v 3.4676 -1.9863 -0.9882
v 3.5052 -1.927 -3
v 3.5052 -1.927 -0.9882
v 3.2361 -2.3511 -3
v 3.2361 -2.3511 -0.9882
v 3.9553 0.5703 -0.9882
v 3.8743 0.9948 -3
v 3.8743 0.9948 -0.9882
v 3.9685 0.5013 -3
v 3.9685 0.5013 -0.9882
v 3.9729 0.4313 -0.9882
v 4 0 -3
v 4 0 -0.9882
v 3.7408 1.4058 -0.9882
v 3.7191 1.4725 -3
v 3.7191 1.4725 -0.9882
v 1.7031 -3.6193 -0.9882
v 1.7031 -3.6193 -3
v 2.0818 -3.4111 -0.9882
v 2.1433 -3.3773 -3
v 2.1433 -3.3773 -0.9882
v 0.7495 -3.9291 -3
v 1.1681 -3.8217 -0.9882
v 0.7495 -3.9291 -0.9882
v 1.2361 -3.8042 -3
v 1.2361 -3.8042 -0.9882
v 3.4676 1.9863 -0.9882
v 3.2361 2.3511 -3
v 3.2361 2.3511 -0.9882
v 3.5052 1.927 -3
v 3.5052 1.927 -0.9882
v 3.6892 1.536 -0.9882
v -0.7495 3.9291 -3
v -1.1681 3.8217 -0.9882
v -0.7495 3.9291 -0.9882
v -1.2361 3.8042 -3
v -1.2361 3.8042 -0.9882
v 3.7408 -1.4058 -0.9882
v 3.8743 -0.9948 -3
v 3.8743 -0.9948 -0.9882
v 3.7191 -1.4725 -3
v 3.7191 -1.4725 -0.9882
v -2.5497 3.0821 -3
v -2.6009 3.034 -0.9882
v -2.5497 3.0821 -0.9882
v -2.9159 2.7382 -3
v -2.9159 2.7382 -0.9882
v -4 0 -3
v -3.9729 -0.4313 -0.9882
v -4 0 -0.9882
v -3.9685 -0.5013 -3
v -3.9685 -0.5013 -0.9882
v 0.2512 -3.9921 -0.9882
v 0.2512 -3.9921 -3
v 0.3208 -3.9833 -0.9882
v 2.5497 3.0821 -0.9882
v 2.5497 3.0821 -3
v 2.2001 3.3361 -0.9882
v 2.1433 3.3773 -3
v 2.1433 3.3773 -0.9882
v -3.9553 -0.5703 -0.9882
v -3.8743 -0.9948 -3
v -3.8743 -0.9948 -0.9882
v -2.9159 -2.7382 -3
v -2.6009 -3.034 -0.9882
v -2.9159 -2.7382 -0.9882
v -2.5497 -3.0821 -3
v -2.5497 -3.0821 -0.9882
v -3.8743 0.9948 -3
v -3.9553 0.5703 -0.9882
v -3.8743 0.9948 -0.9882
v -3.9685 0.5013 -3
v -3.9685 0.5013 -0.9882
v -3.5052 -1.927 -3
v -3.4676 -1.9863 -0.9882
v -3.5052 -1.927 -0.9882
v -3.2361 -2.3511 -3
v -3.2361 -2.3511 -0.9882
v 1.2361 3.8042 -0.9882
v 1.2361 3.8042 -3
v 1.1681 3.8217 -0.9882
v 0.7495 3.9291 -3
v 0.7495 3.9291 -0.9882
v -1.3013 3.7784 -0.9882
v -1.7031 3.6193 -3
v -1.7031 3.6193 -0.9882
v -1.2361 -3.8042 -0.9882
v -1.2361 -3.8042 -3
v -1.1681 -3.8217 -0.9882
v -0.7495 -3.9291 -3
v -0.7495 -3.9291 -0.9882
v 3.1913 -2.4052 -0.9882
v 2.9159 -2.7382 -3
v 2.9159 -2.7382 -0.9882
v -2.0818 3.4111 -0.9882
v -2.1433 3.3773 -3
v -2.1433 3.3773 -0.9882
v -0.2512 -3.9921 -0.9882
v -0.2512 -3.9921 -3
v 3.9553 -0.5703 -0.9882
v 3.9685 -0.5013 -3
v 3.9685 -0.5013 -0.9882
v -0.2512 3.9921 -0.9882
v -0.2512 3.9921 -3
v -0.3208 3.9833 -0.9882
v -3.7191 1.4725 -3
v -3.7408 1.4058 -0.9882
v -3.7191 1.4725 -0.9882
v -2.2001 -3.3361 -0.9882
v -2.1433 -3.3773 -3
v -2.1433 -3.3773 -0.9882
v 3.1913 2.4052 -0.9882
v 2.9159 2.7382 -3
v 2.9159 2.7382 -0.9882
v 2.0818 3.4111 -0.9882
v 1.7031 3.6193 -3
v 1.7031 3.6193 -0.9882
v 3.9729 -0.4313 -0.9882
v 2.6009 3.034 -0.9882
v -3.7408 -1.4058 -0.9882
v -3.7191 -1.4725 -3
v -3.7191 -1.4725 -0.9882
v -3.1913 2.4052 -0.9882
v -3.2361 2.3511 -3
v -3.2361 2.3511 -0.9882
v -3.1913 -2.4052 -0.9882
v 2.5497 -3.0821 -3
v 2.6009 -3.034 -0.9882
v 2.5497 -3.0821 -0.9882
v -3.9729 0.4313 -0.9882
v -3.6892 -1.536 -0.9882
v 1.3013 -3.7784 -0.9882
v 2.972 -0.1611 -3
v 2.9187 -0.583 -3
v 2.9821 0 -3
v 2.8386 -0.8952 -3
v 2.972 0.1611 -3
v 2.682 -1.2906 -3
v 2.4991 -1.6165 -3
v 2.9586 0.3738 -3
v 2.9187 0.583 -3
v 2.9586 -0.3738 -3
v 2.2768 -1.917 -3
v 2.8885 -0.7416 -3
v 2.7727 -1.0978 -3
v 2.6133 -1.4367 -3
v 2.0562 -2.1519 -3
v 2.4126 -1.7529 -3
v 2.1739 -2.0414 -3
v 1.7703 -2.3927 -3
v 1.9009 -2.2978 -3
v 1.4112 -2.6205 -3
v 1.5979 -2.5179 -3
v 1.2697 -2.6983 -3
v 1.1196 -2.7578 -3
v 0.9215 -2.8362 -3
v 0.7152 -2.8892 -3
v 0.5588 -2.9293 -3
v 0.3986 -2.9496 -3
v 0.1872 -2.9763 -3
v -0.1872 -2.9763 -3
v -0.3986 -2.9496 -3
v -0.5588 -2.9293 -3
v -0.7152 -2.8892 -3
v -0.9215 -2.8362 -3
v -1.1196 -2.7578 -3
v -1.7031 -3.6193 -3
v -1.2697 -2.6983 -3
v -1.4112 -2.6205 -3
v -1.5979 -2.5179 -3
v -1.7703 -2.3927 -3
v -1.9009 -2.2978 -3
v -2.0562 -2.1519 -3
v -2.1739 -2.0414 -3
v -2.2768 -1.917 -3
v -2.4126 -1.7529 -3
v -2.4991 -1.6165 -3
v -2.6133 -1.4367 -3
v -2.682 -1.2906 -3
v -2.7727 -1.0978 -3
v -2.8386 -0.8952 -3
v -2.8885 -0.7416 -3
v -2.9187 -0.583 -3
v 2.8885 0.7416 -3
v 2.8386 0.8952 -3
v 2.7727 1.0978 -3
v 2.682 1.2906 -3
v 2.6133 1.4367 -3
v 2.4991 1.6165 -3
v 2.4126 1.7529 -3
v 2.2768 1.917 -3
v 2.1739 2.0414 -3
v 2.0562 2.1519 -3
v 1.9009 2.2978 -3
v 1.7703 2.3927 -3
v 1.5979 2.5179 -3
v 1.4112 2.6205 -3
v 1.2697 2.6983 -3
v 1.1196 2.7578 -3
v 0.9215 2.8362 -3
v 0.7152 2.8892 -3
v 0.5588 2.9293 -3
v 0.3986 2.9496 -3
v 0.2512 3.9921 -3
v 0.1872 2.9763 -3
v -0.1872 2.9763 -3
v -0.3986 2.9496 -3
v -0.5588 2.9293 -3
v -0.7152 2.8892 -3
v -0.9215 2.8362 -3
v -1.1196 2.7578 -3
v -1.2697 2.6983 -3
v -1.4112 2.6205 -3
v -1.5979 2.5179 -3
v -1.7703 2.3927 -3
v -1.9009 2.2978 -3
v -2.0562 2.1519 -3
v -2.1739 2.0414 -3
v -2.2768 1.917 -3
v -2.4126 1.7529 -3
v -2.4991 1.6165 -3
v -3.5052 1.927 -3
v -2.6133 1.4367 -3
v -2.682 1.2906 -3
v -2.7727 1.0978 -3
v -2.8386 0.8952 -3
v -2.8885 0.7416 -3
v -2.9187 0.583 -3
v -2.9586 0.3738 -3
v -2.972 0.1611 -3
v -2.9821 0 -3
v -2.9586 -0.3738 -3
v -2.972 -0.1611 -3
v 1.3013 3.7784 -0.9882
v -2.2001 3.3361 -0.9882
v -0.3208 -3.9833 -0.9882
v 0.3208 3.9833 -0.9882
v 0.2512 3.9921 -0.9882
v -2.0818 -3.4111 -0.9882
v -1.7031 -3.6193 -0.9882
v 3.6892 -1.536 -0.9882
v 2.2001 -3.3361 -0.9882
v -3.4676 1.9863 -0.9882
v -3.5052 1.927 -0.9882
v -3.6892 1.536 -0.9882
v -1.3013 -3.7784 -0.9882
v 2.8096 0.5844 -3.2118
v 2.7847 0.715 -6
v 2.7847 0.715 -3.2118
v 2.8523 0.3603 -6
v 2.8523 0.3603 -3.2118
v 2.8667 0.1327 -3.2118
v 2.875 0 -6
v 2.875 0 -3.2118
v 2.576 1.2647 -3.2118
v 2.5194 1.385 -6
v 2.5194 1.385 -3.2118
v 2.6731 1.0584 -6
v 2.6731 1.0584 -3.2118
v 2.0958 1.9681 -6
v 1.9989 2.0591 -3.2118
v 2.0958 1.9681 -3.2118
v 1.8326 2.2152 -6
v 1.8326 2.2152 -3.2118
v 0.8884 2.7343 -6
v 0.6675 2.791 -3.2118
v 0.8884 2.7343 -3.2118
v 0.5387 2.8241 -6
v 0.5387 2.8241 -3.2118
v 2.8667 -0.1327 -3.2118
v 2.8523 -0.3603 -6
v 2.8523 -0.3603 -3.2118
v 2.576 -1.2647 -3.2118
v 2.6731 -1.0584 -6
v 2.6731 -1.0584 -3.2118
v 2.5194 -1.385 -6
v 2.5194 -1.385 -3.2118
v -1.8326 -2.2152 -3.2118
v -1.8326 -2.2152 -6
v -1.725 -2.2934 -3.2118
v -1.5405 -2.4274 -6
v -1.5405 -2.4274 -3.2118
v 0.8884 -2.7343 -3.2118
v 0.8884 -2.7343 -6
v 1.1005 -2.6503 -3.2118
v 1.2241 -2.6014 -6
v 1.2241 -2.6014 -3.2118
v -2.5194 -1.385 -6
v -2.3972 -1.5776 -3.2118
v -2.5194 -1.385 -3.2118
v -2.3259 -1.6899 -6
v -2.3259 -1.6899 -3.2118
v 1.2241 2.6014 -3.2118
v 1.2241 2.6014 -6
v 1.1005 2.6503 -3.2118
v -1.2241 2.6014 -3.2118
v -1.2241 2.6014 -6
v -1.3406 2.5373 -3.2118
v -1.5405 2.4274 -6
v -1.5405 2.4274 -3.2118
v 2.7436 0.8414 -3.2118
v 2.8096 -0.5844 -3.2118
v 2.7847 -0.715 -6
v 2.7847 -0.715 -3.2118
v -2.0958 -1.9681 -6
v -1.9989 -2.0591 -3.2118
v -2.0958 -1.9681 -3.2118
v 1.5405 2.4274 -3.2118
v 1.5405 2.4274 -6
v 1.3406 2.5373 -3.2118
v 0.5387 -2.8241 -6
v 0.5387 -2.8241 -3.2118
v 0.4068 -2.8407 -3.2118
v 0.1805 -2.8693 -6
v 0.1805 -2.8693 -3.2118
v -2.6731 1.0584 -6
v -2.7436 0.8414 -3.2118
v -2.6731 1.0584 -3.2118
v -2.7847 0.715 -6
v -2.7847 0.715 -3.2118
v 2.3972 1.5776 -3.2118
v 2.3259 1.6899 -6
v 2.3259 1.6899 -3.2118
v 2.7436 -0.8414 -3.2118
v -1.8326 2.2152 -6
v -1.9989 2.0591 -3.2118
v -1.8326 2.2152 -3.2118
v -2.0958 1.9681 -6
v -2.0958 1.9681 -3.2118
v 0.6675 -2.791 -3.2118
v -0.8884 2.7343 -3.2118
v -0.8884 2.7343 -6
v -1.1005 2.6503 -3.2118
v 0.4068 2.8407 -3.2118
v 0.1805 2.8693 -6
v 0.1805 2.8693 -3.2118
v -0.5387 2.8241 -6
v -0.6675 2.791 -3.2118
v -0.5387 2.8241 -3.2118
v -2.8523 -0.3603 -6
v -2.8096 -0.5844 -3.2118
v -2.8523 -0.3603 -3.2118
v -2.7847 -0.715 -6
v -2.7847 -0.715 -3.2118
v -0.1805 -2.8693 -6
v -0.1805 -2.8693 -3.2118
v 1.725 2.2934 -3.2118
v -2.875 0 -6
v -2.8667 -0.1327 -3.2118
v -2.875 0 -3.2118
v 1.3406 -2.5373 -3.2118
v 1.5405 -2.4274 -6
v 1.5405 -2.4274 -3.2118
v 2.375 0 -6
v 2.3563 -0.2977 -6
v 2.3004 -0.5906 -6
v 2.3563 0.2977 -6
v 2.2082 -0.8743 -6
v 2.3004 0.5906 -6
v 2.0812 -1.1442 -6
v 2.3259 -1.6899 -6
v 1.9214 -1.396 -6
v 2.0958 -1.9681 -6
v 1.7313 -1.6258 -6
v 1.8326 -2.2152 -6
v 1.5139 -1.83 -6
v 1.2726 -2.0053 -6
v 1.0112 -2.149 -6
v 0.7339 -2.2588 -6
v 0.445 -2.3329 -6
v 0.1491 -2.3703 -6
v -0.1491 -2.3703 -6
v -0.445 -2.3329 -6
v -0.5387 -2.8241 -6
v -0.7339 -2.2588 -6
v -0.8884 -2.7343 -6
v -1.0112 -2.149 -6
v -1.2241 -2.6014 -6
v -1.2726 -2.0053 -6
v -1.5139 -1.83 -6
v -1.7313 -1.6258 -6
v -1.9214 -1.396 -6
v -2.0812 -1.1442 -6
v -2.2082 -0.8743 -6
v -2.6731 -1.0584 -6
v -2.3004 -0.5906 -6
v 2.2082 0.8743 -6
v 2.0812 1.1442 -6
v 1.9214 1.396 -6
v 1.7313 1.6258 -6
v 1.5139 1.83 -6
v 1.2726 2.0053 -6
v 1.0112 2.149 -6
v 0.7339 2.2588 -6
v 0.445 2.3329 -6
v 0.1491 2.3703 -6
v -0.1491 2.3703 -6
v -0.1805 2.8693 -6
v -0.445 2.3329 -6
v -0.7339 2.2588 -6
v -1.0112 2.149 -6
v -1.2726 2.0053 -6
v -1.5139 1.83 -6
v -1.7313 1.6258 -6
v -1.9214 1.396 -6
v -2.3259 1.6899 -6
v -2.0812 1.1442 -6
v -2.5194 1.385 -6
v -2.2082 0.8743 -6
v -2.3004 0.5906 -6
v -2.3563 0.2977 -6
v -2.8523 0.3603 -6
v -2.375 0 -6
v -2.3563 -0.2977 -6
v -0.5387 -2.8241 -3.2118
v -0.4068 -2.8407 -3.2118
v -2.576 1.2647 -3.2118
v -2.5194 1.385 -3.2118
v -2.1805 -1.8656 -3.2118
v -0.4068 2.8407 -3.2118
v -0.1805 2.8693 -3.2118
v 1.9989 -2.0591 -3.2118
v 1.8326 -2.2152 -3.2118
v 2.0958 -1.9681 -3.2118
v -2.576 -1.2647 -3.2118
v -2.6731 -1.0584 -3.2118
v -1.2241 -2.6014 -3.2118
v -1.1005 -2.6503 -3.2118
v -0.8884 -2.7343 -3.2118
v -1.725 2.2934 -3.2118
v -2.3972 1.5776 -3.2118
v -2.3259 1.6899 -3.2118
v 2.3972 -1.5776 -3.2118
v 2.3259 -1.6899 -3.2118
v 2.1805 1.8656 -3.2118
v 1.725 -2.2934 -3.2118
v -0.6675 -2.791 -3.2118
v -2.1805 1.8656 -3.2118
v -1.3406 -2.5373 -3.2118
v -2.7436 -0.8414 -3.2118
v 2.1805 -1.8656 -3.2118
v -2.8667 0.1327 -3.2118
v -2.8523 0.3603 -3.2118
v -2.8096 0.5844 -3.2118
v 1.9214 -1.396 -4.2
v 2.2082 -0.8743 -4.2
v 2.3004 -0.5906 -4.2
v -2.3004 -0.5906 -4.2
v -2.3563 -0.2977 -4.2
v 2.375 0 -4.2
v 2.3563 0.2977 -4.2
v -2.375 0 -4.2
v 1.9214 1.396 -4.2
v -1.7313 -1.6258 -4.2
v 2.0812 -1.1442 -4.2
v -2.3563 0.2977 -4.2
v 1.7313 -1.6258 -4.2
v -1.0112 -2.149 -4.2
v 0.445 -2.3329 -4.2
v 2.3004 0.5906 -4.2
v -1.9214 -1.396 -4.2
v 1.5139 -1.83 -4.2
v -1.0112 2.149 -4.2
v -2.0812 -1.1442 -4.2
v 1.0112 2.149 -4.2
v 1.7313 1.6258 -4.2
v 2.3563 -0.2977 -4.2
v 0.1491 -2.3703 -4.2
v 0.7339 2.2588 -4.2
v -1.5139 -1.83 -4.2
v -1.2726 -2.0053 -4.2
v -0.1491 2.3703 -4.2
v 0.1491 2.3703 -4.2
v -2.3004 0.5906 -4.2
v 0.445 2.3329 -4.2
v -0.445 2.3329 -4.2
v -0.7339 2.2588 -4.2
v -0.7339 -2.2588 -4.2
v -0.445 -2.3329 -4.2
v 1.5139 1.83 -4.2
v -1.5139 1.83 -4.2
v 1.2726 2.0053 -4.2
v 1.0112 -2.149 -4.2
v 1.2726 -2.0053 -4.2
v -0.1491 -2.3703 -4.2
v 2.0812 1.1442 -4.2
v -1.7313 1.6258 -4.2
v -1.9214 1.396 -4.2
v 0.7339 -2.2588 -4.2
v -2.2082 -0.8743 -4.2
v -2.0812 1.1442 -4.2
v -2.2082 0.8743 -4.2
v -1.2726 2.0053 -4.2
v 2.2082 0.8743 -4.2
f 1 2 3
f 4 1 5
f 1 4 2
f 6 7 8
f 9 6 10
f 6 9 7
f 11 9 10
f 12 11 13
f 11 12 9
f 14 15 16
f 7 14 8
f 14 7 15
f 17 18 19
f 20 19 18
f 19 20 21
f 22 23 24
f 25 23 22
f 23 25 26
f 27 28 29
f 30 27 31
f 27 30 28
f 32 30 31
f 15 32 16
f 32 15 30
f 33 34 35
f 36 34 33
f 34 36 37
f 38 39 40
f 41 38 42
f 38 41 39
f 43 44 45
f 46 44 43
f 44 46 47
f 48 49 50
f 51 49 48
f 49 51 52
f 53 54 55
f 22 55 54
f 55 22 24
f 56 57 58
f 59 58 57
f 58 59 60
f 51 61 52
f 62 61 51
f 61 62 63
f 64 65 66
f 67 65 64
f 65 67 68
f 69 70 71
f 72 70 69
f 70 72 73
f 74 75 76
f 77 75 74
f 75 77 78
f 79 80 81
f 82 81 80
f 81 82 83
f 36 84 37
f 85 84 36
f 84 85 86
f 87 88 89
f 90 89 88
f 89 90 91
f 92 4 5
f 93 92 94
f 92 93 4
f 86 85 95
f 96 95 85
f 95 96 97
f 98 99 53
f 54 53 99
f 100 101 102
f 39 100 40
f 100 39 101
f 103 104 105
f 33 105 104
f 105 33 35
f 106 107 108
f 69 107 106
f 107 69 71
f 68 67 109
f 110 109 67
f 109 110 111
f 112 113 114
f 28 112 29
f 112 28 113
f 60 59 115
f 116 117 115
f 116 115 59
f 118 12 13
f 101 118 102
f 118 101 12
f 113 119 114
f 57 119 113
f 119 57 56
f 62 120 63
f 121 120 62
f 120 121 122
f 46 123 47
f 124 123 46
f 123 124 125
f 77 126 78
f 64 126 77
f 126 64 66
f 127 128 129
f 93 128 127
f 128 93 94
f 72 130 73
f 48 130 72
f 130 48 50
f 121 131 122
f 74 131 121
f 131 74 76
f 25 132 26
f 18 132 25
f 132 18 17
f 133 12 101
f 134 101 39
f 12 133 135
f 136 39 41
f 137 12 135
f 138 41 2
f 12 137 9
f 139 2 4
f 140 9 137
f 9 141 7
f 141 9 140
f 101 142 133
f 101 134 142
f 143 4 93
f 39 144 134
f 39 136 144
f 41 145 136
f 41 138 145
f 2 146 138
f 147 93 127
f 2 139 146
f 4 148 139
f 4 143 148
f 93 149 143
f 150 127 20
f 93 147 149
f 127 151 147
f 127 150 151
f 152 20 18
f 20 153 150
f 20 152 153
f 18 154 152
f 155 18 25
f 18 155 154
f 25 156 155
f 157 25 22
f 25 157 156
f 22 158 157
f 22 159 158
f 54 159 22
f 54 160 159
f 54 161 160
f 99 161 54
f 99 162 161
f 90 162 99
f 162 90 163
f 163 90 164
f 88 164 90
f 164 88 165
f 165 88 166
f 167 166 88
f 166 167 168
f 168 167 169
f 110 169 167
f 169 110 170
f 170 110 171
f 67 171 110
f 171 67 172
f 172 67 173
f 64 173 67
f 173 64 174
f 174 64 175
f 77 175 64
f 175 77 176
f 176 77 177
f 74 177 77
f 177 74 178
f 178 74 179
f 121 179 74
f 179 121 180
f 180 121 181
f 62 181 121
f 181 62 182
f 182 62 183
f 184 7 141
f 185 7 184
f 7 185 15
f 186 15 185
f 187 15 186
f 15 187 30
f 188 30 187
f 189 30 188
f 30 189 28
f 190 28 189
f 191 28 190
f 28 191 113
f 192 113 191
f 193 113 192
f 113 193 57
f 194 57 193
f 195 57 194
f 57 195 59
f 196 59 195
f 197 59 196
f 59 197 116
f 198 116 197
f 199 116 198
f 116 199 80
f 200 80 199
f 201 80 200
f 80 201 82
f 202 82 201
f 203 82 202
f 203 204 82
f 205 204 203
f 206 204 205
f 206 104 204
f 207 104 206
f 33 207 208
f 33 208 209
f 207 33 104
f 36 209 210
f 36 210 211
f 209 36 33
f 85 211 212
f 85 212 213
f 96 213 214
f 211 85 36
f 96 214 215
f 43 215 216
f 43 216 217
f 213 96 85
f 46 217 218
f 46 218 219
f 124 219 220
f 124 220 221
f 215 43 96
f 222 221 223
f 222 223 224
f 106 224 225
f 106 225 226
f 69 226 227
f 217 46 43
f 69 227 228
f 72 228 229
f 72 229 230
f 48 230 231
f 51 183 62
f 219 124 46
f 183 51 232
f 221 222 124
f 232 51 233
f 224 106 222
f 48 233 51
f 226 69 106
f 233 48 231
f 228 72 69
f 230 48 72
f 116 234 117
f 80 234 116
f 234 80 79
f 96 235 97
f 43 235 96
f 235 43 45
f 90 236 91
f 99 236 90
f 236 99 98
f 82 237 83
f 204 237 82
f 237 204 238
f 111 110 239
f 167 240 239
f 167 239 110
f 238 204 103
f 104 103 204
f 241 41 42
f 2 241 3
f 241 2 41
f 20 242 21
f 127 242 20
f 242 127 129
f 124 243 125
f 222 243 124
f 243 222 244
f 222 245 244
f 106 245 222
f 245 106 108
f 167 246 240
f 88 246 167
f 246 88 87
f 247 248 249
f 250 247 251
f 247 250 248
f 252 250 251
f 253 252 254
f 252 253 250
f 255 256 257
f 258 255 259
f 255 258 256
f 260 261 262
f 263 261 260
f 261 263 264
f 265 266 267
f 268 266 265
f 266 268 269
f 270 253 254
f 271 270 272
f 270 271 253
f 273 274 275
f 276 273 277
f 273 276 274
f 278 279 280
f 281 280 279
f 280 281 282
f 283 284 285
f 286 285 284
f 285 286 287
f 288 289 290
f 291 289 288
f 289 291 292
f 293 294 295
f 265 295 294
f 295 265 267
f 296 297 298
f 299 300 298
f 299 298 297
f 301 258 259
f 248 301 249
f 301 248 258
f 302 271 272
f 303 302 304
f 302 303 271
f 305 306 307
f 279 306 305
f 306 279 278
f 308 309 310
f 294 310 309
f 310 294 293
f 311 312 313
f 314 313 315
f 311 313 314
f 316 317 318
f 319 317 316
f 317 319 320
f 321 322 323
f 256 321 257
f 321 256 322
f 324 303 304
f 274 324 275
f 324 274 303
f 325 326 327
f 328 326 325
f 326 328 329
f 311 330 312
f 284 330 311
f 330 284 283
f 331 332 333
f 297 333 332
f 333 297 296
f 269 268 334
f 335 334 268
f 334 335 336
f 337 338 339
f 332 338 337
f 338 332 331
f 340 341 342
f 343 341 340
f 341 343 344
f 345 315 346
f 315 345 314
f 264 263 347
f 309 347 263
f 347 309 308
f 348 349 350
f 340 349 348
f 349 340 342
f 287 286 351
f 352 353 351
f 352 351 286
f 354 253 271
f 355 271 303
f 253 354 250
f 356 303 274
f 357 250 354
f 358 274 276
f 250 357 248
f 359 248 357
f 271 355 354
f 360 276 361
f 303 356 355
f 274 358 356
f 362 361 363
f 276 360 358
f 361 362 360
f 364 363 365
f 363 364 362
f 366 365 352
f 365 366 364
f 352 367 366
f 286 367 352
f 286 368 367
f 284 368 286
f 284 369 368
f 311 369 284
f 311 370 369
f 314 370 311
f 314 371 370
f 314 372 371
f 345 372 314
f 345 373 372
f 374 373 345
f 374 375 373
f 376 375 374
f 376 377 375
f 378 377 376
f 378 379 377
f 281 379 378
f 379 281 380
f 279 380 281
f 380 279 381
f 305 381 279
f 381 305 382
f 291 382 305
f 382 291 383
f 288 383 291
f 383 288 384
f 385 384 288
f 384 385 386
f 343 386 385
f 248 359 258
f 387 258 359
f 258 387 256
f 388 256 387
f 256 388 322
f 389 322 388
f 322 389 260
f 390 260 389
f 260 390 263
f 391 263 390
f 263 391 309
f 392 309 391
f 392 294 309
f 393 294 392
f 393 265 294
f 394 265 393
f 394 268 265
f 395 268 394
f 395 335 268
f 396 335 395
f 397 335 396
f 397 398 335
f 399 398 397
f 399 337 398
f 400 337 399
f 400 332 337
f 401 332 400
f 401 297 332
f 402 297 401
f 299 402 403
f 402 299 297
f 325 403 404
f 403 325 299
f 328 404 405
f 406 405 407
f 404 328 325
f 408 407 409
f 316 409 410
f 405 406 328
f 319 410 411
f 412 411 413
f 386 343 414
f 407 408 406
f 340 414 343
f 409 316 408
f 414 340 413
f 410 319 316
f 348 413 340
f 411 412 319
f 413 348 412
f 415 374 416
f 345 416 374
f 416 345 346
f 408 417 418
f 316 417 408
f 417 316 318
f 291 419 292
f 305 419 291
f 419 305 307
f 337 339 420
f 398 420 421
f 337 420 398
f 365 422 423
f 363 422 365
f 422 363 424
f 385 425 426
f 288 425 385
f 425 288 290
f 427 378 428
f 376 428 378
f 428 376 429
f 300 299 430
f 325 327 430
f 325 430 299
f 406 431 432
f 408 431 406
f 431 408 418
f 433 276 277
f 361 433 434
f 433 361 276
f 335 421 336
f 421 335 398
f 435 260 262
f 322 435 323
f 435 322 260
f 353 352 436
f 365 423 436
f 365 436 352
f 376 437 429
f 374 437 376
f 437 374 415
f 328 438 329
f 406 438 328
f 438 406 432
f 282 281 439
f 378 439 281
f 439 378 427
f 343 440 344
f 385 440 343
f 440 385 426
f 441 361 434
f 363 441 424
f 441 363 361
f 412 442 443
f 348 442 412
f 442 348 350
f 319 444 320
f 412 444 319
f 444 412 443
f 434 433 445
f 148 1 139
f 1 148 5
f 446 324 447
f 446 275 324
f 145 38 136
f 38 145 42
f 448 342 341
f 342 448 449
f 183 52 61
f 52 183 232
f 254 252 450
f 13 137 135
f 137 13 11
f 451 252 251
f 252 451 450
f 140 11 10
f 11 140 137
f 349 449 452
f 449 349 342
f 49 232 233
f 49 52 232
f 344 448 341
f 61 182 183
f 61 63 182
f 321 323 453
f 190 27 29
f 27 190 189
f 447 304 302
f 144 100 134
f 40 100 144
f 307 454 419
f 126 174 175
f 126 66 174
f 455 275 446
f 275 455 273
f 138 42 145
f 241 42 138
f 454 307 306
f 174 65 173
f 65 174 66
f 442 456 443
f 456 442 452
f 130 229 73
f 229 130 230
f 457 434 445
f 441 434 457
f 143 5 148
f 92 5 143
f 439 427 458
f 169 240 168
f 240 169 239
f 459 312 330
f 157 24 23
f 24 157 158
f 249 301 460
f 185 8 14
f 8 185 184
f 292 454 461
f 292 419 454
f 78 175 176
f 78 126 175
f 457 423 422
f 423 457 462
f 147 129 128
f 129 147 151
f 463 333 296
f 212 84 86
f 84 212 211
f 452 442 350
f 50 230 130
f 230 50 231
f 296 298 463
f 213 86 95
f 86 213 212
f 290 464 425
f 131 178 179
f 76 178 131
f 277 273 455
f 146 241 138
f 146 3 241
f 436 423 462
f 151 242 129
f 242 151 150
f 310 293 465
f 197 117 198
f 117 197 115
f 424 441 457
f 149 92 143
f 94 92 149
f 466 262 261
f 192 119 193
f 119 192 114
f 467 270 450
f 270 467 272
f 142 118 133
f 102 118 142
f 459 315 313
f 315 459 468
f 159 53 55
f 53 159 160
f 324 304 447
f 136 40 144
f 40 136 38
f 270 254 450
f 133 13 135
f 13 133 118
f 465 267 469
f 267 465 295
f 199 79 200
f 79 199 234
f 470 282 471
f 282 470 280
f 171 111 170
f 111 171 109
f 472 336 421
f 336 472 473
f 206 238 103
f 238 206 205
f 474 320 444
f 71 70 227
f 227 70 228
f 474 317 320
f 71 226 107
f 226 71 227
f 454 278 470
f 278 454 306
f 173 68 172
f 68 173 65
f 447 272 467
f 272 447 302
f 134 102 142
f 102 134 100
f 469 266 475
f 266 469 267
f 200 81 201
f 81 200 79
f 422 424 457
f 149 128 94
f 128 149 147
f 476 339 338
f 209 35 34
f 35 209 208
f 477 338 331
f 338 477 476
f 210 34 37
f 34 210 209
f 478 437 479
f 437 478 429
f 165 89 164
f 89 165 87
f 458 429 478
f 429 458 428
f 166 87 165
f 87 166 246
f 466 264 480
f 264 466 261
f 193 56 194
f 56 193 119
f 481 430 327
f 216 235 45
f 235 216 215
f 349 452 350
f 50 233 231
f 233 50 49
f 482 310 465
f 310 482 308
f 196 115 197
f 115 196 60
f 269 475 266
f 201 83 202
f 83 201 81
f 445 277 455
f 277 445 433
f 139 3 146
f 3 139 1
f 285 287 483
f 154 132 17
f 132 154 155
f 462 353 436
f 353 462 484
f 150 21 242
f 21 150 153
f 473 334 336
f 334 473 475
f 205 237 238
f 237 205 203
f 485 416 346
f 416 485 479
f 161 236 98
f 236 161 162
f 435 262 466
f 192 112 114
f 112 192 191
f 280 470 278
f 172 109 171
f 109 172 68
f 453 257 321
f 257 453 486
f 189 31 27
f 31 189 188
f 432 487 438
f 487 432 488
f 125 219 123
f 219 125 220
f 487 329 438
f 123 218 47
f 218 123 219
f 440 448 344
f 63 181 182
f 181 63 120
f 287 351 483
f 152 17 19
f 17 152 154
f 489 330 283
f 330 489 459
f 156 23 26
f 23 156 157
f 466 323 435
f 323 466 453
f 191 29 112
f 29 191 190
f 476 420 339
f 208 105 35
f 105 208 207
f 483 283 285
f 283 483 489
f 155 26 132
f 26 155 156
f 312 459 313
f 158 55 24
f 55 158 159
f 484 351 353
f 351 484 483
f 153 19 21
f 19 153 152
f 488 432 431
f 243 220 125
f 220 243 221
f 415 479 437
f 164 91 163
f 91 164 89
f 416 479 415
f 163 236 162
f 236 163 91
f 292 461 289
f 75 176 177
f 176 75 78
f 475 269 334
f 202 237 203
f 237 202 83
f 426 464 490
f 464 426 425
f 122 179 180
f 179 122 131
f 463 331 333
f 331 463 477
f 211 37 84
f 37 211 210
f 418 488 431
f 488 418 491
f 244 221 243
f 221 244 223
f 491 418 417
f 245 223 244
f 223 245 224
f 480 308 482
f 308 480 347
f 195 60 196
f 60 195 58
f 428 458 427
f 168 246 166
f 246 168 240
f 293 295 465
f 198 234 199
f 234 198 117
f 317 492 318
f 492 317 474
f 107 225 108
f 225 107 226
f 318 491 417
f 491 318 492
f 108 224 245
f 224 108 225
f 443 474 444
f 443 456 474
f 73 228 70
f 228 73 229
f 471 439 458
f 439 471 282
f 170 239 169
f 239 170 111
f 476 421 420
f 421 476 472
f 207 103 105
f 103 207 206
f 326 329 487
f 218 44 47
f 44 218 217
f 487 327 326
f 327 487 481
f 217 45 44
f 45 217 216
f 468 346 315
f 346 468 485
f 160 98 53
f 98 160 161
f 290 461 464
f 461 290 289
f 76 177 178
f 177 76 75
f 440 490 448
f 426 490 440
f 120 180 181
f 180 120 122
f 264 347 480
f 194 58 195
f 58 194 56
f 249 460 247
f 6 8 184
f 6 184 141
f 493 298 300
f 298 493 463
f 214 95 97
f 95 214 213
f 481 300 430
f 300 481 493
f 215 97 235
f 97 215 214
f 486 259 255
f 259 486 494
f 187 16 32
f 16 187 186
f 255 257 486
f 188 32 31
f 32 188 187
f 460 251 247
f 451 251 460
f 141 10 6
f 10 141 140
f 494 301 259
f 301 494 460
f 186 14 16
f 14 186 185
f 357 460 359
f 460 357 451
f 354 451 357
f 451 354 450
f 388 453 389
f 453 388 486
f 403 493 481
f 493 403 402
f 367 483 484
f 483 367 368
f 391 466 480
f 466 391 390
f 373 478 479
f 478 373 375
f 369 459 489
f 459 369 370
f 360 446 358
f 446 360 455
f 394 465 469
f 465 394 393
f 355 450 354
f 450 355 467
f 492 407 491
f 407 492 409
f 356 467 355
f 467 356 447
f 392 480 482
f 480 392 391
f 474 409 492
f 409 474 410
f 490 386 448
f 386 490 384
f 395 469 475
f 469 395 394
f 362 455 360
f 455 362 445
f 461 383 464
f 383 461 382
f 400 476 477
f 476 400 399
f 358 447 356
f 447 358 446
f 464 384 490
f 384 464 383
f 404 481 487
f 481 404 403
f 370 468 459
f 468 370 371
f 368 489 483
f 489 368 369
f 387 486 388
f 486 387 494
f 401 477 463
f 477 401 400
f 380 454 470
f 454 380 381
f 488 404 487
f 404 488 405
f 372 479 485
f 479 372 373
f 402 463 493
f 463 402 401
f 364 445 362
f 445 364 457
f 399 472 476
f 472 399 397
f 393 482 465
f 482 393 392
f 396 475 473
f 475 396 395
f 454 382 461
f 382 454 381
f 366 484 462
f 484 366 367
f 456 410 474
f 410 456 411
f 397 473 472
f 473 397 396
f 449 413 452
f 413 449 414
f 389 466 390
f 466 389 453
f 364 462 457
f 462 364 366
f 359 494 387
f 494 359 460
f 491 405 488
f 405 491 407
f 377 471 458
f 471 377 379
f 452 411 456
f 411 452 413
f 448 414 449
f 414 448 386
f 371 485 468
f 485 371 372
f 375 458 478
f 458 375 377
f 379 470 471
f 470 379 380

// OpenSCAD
$fn = 50;

difference() {
	union() {
		translate(v = [0, 0, -3.0]) {
			cylinder(h = 3, r = 4.0);
		}
		#translate(v = [0, 0, -6.0]) {
			cylinder(h = 6, r = 2.875);
		}
	}
	union() {
		translate(v = [0, 0, 0]) {
			rotate(a = [0, 0, 0]) {
				difference() {
					union() {
						translate(v = [0, 0, -6.0]) {
							cylinder(h = 6, r = 2.25);
						}
						translate(v = [0, 0, -4.2]) {
							cylinder(h = 4.2, r1 = 2.375, r2 = 4.5);
						}
						translate(v = [0, 0, -6.0]) {
							cylinder(h = 6, r = 2.375);
						}
						translate(v = [0, 0, -6.0]) {
							cylinder(h = 6, r = 2.25);
						}
					}
					union();
				}
			}
		}
	}
}
